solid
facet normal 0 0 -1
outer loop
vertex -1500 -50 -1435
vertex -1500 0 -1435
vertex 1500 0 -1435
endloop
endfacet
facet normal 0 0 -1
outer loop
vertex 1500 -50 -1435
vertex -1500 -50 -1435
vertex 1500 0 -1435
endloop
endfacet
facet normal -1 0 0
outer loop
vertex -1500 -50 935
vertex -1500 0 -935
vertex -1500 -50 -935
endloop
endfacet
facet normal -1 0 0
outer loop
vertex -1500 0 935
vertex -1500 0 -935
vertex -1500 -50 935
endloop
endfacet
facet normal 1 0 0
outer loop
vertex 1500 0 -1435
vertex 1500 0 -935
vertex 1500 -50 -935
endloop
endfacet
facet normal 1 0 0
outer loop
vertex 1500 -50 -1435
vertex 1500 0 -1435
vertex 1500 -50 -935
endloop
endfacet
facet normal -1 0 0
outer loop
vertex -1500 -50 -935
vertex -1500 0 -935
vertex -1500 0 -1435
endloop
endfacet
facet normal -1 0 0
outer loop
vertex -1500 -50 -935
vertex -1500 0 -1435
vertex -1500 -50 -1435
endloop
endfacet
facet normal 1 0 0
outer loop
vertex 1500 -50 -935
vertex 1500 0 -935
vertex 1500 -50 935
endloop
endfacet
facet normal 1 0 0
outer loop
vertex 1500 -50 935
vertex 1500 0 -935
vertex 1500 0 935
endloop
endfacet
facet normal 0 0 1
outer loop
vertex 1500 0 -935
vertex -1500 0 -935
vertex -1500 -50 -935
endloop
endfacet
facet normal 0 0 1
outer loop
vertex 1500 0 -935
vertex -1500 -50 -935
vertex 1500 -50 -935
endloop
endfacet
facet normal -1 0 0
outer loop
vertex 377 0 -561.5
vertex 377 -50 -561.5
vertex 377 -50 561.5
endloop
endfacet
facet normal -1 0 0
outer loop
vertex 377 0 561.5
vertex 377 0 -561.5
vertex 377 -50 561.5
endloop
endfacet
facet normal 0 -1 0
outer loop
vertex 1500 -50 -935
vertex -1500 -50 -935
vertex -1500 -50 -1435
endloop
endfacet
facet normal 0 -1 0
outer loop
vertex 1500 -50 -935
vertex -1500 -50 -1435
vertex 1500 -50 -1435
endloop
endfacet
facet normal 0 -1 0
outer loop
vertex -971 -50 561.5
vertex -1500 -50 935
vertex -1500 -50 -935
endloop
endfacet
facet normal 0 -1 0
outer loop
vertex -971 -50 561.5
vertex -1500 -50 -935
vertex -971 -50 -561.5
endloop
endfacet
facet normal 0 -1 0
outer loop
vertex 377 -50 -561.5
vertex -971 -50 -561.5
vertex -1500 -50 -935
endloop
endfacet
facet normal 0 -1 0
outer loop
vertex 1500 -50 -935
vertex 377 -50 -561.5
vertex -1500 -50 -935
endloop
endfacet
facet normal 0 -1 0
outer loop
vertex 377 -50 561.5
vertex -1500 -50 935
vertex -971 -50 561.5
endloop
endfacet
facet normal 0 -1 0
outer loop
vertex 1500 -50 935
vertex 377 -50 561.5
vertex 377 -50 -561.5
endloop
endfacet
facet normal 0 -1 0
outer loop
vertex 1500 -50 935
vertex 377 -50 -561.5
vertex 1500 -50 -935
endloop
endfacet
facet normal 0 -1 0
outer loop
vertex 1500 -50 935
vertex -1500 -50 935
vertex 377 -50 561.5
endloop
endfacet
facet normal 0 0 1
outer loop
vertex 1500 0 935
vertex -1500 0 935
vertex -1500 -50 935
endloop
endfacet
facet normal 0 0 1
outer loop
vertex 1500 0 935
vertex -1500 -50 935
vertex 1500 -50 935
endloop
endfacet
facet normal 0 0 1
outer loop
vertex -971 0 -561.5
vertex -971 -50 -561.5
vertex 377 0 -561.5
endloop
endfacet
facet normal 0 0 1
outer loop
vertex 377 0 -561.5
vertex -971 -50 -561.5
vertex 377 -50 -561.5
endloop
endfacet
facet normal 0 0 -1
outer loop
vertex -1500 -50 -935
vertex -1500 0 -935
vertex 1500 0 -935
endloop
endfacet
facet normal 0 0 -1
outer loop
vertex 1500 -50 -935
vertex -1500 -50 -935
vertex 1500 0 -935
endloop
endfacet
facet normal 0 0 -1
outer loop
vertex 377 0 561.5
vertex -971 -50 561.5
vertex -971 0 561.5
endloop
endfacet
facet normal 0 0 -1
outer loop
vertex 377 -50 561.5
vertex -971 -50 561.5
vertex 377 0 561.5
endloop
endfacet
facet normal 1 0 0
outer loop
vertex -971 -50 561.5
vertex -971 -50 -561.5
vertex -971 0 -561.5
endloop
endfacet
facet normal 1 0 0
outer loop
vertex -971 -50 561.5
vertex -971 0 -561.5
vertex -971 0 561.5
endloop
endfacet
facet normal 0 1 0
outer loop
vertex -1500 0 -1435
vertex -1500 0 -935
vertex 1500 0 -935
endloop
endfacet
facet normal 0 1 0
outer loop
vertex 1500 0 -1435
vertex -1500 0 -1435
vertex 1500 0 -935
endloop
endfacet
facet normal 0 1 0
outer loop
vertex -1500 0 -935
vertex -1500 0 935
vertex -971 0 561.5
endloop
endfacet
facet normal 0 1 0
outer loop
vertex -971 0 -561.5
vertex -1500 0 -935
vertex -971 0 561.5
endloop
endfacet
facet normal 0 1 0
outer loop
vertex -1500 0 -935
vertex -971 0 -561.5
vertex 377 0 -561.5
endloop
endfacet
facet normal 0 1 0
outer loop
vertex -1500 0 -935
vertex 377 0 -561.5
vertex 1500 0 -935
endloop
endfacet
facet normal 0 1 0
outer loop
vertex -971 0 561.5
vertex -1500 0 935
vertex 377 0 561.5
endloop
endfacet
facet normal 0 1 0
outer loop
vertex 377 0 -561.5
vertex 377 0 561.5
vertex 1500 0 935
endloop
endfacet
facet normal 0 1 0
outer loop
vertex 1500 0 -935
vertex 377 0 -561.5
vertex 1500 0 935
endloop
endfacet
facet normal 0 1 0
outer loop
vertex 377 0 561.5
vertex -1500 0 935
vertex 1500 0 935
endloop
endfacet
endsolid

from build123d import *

# Parameters (mm, degrees)
F0_W     = 3000
F0_H     = 1870
F1_DEPTH = 50
F2_W     = 1348
F2_H     = 1123
F3_DEPTH = 50
F4_DEPTH = 500


with BuildPart() as f1:
    # F0 (on Front) → F1 (new body)
    with BuildSketch(Plane.XZ):
        Rectangle(F0_W, F0_H)
    extrude(amount=F1_DEPTH)

    # F2 (on face) → F3 (cut, through all)
    with BuildSketch(Plane.XZ.offset(50)):
        with Locations((-297, 0)):
            Rectangle(F2_W, F2_H)
    extrude(amount=-F3_DEPTH, mode=Mode.SUBTRACT)


with BuildPart() as f4:
    # F4 (new): a face of the model
    f4_faces = [f1.part.faces().sort_by_distance(p)[0] for p in [
        (0, -25, -935),
    ]]
    extrude(f4_faces, amount=F4_DEPTH)


solid = Compound([f1.part, f4.part])
